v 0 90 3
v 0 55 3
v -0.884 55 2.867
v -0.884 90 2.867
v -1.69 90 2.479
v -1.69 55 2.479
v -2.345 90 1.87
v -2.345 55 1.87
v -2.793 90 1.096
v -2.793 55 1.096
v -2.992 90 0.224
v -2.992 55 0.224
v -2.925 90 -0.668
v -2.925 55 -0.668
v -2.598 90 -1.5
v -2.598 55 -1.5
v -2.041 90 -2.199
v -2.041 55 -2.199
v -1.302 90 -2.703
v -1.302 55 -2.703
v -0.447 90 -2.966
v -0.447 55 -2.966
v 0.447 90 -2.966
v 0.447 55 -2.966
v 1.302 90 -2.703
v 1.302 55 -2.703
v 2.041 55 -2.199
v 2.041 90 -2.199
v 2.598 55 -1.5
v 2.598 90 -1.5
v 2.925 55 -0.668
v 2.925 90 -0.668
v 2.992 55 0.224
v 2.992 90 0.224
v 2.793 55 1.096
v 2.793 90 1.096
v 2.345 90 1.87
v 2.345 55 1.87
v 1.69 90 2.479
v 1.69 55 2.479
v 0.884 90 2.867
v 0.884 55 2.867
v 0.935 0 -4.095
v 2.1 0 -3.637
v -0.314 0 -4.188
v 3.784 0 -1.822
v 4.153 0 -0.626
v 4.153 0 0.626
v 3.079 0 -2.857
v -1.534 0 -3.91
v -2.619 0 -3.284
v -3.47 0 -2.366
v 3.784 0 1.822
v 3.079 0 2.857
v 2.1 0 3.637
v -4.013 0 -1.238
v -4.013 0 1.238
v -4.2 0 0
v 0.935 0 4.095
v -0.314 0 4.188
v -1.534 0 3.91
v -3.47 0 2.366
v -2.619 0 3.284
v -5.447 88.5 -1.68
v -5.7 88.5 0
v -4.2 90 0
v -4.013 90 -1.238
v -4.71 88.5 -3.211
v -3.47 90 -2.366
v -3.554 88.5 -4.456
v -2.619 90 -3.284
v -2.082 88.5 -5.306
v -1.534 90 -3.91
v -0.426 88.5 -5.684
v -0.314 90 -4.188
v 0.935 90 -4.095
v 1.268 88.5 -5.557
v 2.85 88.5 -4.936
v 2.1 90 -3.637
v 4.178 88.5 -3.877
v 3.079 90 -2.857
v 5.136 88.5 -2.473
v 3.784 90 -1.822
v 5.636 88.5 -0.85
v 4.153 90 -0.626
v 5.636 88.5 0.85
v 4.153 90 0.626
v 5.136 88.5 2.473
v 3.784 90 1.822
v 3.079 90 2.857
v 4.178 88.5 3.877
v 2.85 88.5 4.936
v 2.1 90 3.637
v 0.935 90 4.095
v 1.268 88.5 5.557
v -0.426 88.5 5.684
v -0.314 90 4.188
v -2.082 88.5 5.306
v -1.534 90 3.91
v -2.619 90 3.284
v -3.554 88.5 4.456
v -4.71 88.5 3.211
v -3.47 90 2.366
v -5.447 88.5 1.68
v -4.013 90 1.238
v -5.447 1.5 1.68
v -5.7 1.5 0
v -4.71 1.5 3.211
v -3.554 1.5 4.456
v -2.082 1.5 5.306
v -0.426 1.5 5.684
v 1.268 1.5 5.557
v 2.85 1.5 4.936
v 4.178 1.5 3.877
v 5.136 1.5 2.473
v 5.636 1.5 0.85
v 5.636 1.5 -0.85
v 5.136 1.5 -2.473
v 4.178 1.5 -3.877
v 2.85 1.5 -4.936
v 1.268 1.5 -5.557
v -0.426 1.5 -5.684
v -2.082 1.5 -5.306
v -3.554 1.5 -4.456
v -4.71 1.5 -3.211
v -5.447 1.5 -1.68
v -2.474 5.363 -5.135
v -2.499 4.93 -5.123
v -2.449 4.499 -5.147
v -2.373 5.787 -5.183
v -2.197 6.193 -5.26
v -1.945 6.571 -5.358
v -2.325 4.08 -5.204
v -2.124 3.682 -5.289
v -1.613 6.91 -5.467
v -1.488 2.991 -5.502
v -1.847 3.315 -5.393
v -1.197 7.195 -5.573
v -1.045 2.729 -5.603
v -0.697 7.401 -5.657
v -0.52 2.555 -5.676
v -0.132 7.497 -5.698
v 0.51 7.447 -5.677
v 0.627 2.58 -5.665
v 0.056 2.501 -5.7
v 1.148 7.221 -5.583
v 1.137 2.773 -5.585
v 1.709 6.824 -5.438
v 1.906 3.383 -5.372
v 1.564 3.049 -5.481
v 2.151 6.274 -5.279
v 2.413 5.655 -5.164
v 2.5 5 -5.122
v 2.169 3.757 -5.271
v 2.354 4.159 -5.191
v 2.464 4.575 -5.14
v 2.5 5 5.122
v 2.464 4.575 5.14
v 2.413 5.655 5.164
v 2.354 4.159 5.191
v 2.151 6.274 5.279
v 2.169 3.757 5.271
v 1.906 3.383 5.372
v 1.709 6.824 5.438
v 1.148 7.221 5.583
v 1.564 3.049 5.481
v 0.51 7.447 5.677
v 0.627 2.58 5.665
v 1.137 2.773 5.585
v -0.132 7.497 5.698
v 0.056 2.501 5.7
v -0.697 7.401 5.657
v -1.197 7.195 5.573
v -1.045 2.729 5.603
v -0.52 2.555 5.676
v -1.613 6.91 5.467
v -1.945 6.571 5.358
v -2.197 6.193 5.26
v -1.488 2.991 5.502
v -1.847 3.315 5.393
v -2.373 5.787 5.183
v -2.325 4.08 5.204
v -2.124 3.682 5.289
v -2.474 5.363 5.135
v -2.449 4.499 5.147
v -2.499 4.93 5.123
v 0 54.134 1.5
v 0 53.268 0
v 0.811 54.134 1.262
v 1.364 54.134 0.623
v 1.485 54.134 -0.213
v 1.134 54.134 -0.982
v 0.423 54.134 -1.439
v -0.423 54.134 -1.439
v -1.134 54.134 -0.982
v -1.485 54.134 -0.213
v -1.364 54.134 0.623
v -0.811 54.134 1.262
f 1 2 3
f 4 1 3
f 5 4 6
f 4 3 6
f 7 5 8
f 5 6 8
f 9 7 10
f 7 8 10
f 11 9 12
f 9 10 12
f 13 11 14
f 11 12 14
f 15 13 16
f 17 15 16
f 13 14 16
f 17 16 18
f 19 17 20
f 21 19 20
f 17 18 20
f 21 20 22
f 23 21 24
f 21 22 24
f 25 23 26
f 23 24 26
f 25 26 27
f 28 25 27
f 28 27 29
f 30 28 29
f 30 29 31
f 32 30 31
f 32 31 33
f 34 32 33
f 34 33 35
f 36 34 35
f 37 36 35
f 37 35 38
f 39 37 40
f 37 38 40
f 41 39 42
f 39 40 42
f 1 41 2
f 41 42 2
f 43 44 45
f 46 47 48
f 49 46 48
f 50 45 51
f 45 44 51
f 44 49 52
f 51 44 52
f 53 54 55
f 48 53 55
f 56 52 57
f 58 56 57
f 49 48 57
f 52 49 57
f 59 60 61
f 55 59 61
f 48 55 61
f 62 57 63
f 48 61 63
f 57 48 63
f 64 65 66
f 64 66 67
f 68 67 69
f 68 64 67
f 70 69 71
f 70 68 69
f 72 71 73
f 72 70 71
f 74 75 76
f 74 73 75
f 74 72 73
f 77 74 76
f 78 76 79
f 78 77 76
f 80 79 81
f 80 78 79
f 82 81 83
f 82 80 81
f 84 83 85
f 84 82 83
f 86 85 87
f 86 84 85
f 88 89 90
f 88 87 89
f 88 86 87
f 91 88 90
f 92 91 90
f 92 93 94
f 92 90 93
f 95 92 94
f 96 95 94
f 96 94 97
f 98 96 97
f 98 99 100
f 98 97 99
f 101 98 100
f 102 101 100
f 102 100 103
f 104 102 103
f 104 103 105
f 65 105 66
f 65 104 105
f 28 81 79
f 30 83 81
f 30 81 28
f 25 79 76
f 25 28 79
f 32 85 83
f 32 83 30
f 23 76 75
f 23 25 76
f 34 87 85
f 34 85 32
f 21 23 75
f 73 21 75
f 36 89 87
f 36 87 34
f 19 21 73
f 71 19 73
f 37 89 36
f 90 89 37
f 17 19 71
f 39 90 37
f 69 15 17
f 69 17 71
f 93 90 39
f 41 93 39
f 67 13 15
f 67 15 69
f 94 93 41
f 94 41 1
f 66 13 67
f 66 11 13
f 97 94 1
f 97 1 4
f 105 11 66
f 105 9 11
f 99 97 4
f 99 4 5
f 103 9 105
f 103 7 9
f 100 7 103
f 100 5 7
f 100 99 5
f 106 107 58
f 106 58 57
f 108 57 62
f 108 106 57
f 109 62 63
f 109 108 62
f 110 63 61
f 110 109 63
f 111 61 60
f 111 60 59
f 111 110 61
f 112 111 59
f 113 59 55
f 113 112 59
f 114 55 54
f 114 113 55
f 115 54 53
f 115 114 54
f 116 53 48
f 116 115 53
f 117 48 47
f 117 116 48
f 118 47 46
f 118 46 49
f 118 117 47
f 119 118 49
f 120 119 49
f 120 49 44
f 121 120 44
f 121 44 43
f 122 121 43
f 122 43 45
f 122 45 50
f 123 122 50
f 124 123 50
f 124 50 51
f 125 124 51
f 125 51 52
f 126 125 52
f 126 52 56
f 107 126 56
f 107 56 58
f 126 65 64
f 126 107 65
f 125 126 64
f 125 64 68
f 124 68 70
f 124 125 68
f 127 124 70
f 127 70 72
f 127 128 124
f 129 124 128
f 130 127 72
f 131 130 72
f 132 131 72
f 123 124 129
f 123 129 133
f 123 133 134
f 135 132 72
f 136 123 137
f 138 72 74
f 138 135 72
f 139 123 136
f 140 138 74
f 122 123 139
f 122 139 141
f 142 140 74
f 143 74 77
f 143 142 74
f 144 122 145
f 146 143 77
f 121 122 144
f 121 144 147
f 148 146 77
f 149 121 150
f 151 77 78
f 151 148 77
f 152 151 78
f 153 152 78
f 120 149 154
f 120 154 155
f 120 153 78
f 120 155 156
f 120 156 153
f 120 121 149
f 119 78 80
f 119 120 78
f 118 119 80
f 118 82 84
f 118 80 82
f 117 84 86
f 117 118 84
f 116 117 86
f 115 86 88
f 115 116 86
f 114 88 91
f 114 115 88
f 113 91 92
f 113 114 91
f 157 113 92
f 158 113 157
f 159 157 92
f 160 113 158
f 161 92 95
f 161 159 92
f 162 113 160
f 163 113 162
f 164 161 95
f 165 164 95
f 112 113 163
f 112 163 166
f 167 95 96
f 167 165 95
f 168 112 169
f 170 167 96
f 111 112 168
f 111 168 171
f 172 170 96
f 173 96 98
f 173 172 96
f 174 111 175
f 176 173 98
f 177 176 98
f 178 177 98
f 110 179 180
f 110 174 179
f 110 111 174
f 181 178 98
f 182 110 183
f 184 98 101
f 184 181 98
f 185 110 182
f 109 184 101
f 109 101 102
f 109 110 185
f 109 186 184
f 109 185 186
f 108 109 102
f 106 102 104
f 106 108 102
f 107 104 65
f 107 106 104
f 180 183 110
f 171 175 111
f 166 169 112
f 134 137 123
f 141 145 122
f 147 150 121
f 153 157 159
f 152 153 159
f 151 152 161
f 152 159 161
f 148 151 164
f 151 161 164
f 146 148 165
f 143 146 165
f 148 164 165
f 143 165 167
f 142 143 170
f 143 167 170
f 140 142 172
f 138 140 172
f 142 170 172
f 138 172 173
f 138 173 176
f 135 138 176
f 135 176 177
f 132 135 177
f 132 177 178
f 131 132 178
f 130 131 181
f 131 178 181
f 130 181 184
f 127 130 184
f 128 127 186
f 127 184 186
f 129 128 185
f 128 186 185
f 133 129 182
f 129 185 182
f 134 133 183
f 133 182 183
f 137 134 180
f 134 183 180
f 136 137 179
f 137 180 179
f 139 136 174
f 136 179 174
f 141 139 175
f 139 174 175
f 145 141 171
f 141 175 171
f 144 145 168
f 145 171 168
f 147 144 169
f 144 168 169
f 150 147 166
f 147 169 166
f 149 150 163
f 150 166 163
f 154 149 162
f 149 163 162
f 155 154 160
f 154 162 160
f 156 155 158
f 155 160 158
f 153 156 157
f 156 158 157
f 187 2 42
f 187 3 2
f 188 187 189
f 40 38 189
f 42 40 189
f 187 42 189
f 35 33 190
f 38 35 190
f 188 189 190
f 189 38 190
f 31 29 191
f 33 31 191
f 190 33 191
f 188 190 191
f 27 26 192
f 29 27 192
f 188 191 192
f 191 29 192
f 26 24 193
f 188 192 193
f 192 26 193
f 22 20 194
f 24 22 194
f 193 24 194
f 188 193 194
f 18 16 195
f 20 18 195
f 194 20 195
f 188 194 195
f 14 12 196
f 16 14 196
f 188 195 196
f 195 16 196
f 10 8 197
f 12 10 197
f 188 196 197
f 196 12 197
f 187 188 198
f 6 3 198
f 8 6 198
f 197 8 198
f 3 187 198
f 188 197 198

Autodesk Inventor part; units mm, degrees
ref_plane "YZ Plane" through (0, 0, 0) normal (1, 0, 0) x (0, 1, 0)
ref_plane "XZ Plane" through (0, 0, 0) normal (0, 1, 0) x (-1, 0, 0)
ref_plane "XY Plane" through (0, 0, 0) normal (0, 0, 1) x (1, 0, 0)
sketch "Szkic1" plane through (0, 0, 0) normal (0, 1, 0) x (-1, 0, 0)
  circle A0 centre (0, 0) radius 5.7
  dimension "d0" = 11.4
extrude "Wyciągnięcie proste1" add sketch "Szkic1" along normal blind 90
sketch "Szkic5" plane through (0, 90, 0) normal (0, 1, 0) x (1, 0, 0)
  point P0 (0, 0)
  point P1 (0, 0)
hole "Otwór2" at (0, 90, 0) direction (0, -1, 0) diameter 6 depth 35 tip angle 120
chamfer "Faza1" distance 1.5 angle 45 2 edges at (5.7, 90, 0) (5.7, 0, 0)
sketch "Szkic6" plane through (0, 0, 0) normal (0, 0, 1) x (1, 0, 0)
  circle A0 centre (0, 5) radius 2.5
  point P0 (0, 0)
  dimension "d20" = 5
extrude "Wyciągnięcie proste2" cut sketch "Szkic6" along normal mid plane 30
properties material "Stal nierdzewna"
